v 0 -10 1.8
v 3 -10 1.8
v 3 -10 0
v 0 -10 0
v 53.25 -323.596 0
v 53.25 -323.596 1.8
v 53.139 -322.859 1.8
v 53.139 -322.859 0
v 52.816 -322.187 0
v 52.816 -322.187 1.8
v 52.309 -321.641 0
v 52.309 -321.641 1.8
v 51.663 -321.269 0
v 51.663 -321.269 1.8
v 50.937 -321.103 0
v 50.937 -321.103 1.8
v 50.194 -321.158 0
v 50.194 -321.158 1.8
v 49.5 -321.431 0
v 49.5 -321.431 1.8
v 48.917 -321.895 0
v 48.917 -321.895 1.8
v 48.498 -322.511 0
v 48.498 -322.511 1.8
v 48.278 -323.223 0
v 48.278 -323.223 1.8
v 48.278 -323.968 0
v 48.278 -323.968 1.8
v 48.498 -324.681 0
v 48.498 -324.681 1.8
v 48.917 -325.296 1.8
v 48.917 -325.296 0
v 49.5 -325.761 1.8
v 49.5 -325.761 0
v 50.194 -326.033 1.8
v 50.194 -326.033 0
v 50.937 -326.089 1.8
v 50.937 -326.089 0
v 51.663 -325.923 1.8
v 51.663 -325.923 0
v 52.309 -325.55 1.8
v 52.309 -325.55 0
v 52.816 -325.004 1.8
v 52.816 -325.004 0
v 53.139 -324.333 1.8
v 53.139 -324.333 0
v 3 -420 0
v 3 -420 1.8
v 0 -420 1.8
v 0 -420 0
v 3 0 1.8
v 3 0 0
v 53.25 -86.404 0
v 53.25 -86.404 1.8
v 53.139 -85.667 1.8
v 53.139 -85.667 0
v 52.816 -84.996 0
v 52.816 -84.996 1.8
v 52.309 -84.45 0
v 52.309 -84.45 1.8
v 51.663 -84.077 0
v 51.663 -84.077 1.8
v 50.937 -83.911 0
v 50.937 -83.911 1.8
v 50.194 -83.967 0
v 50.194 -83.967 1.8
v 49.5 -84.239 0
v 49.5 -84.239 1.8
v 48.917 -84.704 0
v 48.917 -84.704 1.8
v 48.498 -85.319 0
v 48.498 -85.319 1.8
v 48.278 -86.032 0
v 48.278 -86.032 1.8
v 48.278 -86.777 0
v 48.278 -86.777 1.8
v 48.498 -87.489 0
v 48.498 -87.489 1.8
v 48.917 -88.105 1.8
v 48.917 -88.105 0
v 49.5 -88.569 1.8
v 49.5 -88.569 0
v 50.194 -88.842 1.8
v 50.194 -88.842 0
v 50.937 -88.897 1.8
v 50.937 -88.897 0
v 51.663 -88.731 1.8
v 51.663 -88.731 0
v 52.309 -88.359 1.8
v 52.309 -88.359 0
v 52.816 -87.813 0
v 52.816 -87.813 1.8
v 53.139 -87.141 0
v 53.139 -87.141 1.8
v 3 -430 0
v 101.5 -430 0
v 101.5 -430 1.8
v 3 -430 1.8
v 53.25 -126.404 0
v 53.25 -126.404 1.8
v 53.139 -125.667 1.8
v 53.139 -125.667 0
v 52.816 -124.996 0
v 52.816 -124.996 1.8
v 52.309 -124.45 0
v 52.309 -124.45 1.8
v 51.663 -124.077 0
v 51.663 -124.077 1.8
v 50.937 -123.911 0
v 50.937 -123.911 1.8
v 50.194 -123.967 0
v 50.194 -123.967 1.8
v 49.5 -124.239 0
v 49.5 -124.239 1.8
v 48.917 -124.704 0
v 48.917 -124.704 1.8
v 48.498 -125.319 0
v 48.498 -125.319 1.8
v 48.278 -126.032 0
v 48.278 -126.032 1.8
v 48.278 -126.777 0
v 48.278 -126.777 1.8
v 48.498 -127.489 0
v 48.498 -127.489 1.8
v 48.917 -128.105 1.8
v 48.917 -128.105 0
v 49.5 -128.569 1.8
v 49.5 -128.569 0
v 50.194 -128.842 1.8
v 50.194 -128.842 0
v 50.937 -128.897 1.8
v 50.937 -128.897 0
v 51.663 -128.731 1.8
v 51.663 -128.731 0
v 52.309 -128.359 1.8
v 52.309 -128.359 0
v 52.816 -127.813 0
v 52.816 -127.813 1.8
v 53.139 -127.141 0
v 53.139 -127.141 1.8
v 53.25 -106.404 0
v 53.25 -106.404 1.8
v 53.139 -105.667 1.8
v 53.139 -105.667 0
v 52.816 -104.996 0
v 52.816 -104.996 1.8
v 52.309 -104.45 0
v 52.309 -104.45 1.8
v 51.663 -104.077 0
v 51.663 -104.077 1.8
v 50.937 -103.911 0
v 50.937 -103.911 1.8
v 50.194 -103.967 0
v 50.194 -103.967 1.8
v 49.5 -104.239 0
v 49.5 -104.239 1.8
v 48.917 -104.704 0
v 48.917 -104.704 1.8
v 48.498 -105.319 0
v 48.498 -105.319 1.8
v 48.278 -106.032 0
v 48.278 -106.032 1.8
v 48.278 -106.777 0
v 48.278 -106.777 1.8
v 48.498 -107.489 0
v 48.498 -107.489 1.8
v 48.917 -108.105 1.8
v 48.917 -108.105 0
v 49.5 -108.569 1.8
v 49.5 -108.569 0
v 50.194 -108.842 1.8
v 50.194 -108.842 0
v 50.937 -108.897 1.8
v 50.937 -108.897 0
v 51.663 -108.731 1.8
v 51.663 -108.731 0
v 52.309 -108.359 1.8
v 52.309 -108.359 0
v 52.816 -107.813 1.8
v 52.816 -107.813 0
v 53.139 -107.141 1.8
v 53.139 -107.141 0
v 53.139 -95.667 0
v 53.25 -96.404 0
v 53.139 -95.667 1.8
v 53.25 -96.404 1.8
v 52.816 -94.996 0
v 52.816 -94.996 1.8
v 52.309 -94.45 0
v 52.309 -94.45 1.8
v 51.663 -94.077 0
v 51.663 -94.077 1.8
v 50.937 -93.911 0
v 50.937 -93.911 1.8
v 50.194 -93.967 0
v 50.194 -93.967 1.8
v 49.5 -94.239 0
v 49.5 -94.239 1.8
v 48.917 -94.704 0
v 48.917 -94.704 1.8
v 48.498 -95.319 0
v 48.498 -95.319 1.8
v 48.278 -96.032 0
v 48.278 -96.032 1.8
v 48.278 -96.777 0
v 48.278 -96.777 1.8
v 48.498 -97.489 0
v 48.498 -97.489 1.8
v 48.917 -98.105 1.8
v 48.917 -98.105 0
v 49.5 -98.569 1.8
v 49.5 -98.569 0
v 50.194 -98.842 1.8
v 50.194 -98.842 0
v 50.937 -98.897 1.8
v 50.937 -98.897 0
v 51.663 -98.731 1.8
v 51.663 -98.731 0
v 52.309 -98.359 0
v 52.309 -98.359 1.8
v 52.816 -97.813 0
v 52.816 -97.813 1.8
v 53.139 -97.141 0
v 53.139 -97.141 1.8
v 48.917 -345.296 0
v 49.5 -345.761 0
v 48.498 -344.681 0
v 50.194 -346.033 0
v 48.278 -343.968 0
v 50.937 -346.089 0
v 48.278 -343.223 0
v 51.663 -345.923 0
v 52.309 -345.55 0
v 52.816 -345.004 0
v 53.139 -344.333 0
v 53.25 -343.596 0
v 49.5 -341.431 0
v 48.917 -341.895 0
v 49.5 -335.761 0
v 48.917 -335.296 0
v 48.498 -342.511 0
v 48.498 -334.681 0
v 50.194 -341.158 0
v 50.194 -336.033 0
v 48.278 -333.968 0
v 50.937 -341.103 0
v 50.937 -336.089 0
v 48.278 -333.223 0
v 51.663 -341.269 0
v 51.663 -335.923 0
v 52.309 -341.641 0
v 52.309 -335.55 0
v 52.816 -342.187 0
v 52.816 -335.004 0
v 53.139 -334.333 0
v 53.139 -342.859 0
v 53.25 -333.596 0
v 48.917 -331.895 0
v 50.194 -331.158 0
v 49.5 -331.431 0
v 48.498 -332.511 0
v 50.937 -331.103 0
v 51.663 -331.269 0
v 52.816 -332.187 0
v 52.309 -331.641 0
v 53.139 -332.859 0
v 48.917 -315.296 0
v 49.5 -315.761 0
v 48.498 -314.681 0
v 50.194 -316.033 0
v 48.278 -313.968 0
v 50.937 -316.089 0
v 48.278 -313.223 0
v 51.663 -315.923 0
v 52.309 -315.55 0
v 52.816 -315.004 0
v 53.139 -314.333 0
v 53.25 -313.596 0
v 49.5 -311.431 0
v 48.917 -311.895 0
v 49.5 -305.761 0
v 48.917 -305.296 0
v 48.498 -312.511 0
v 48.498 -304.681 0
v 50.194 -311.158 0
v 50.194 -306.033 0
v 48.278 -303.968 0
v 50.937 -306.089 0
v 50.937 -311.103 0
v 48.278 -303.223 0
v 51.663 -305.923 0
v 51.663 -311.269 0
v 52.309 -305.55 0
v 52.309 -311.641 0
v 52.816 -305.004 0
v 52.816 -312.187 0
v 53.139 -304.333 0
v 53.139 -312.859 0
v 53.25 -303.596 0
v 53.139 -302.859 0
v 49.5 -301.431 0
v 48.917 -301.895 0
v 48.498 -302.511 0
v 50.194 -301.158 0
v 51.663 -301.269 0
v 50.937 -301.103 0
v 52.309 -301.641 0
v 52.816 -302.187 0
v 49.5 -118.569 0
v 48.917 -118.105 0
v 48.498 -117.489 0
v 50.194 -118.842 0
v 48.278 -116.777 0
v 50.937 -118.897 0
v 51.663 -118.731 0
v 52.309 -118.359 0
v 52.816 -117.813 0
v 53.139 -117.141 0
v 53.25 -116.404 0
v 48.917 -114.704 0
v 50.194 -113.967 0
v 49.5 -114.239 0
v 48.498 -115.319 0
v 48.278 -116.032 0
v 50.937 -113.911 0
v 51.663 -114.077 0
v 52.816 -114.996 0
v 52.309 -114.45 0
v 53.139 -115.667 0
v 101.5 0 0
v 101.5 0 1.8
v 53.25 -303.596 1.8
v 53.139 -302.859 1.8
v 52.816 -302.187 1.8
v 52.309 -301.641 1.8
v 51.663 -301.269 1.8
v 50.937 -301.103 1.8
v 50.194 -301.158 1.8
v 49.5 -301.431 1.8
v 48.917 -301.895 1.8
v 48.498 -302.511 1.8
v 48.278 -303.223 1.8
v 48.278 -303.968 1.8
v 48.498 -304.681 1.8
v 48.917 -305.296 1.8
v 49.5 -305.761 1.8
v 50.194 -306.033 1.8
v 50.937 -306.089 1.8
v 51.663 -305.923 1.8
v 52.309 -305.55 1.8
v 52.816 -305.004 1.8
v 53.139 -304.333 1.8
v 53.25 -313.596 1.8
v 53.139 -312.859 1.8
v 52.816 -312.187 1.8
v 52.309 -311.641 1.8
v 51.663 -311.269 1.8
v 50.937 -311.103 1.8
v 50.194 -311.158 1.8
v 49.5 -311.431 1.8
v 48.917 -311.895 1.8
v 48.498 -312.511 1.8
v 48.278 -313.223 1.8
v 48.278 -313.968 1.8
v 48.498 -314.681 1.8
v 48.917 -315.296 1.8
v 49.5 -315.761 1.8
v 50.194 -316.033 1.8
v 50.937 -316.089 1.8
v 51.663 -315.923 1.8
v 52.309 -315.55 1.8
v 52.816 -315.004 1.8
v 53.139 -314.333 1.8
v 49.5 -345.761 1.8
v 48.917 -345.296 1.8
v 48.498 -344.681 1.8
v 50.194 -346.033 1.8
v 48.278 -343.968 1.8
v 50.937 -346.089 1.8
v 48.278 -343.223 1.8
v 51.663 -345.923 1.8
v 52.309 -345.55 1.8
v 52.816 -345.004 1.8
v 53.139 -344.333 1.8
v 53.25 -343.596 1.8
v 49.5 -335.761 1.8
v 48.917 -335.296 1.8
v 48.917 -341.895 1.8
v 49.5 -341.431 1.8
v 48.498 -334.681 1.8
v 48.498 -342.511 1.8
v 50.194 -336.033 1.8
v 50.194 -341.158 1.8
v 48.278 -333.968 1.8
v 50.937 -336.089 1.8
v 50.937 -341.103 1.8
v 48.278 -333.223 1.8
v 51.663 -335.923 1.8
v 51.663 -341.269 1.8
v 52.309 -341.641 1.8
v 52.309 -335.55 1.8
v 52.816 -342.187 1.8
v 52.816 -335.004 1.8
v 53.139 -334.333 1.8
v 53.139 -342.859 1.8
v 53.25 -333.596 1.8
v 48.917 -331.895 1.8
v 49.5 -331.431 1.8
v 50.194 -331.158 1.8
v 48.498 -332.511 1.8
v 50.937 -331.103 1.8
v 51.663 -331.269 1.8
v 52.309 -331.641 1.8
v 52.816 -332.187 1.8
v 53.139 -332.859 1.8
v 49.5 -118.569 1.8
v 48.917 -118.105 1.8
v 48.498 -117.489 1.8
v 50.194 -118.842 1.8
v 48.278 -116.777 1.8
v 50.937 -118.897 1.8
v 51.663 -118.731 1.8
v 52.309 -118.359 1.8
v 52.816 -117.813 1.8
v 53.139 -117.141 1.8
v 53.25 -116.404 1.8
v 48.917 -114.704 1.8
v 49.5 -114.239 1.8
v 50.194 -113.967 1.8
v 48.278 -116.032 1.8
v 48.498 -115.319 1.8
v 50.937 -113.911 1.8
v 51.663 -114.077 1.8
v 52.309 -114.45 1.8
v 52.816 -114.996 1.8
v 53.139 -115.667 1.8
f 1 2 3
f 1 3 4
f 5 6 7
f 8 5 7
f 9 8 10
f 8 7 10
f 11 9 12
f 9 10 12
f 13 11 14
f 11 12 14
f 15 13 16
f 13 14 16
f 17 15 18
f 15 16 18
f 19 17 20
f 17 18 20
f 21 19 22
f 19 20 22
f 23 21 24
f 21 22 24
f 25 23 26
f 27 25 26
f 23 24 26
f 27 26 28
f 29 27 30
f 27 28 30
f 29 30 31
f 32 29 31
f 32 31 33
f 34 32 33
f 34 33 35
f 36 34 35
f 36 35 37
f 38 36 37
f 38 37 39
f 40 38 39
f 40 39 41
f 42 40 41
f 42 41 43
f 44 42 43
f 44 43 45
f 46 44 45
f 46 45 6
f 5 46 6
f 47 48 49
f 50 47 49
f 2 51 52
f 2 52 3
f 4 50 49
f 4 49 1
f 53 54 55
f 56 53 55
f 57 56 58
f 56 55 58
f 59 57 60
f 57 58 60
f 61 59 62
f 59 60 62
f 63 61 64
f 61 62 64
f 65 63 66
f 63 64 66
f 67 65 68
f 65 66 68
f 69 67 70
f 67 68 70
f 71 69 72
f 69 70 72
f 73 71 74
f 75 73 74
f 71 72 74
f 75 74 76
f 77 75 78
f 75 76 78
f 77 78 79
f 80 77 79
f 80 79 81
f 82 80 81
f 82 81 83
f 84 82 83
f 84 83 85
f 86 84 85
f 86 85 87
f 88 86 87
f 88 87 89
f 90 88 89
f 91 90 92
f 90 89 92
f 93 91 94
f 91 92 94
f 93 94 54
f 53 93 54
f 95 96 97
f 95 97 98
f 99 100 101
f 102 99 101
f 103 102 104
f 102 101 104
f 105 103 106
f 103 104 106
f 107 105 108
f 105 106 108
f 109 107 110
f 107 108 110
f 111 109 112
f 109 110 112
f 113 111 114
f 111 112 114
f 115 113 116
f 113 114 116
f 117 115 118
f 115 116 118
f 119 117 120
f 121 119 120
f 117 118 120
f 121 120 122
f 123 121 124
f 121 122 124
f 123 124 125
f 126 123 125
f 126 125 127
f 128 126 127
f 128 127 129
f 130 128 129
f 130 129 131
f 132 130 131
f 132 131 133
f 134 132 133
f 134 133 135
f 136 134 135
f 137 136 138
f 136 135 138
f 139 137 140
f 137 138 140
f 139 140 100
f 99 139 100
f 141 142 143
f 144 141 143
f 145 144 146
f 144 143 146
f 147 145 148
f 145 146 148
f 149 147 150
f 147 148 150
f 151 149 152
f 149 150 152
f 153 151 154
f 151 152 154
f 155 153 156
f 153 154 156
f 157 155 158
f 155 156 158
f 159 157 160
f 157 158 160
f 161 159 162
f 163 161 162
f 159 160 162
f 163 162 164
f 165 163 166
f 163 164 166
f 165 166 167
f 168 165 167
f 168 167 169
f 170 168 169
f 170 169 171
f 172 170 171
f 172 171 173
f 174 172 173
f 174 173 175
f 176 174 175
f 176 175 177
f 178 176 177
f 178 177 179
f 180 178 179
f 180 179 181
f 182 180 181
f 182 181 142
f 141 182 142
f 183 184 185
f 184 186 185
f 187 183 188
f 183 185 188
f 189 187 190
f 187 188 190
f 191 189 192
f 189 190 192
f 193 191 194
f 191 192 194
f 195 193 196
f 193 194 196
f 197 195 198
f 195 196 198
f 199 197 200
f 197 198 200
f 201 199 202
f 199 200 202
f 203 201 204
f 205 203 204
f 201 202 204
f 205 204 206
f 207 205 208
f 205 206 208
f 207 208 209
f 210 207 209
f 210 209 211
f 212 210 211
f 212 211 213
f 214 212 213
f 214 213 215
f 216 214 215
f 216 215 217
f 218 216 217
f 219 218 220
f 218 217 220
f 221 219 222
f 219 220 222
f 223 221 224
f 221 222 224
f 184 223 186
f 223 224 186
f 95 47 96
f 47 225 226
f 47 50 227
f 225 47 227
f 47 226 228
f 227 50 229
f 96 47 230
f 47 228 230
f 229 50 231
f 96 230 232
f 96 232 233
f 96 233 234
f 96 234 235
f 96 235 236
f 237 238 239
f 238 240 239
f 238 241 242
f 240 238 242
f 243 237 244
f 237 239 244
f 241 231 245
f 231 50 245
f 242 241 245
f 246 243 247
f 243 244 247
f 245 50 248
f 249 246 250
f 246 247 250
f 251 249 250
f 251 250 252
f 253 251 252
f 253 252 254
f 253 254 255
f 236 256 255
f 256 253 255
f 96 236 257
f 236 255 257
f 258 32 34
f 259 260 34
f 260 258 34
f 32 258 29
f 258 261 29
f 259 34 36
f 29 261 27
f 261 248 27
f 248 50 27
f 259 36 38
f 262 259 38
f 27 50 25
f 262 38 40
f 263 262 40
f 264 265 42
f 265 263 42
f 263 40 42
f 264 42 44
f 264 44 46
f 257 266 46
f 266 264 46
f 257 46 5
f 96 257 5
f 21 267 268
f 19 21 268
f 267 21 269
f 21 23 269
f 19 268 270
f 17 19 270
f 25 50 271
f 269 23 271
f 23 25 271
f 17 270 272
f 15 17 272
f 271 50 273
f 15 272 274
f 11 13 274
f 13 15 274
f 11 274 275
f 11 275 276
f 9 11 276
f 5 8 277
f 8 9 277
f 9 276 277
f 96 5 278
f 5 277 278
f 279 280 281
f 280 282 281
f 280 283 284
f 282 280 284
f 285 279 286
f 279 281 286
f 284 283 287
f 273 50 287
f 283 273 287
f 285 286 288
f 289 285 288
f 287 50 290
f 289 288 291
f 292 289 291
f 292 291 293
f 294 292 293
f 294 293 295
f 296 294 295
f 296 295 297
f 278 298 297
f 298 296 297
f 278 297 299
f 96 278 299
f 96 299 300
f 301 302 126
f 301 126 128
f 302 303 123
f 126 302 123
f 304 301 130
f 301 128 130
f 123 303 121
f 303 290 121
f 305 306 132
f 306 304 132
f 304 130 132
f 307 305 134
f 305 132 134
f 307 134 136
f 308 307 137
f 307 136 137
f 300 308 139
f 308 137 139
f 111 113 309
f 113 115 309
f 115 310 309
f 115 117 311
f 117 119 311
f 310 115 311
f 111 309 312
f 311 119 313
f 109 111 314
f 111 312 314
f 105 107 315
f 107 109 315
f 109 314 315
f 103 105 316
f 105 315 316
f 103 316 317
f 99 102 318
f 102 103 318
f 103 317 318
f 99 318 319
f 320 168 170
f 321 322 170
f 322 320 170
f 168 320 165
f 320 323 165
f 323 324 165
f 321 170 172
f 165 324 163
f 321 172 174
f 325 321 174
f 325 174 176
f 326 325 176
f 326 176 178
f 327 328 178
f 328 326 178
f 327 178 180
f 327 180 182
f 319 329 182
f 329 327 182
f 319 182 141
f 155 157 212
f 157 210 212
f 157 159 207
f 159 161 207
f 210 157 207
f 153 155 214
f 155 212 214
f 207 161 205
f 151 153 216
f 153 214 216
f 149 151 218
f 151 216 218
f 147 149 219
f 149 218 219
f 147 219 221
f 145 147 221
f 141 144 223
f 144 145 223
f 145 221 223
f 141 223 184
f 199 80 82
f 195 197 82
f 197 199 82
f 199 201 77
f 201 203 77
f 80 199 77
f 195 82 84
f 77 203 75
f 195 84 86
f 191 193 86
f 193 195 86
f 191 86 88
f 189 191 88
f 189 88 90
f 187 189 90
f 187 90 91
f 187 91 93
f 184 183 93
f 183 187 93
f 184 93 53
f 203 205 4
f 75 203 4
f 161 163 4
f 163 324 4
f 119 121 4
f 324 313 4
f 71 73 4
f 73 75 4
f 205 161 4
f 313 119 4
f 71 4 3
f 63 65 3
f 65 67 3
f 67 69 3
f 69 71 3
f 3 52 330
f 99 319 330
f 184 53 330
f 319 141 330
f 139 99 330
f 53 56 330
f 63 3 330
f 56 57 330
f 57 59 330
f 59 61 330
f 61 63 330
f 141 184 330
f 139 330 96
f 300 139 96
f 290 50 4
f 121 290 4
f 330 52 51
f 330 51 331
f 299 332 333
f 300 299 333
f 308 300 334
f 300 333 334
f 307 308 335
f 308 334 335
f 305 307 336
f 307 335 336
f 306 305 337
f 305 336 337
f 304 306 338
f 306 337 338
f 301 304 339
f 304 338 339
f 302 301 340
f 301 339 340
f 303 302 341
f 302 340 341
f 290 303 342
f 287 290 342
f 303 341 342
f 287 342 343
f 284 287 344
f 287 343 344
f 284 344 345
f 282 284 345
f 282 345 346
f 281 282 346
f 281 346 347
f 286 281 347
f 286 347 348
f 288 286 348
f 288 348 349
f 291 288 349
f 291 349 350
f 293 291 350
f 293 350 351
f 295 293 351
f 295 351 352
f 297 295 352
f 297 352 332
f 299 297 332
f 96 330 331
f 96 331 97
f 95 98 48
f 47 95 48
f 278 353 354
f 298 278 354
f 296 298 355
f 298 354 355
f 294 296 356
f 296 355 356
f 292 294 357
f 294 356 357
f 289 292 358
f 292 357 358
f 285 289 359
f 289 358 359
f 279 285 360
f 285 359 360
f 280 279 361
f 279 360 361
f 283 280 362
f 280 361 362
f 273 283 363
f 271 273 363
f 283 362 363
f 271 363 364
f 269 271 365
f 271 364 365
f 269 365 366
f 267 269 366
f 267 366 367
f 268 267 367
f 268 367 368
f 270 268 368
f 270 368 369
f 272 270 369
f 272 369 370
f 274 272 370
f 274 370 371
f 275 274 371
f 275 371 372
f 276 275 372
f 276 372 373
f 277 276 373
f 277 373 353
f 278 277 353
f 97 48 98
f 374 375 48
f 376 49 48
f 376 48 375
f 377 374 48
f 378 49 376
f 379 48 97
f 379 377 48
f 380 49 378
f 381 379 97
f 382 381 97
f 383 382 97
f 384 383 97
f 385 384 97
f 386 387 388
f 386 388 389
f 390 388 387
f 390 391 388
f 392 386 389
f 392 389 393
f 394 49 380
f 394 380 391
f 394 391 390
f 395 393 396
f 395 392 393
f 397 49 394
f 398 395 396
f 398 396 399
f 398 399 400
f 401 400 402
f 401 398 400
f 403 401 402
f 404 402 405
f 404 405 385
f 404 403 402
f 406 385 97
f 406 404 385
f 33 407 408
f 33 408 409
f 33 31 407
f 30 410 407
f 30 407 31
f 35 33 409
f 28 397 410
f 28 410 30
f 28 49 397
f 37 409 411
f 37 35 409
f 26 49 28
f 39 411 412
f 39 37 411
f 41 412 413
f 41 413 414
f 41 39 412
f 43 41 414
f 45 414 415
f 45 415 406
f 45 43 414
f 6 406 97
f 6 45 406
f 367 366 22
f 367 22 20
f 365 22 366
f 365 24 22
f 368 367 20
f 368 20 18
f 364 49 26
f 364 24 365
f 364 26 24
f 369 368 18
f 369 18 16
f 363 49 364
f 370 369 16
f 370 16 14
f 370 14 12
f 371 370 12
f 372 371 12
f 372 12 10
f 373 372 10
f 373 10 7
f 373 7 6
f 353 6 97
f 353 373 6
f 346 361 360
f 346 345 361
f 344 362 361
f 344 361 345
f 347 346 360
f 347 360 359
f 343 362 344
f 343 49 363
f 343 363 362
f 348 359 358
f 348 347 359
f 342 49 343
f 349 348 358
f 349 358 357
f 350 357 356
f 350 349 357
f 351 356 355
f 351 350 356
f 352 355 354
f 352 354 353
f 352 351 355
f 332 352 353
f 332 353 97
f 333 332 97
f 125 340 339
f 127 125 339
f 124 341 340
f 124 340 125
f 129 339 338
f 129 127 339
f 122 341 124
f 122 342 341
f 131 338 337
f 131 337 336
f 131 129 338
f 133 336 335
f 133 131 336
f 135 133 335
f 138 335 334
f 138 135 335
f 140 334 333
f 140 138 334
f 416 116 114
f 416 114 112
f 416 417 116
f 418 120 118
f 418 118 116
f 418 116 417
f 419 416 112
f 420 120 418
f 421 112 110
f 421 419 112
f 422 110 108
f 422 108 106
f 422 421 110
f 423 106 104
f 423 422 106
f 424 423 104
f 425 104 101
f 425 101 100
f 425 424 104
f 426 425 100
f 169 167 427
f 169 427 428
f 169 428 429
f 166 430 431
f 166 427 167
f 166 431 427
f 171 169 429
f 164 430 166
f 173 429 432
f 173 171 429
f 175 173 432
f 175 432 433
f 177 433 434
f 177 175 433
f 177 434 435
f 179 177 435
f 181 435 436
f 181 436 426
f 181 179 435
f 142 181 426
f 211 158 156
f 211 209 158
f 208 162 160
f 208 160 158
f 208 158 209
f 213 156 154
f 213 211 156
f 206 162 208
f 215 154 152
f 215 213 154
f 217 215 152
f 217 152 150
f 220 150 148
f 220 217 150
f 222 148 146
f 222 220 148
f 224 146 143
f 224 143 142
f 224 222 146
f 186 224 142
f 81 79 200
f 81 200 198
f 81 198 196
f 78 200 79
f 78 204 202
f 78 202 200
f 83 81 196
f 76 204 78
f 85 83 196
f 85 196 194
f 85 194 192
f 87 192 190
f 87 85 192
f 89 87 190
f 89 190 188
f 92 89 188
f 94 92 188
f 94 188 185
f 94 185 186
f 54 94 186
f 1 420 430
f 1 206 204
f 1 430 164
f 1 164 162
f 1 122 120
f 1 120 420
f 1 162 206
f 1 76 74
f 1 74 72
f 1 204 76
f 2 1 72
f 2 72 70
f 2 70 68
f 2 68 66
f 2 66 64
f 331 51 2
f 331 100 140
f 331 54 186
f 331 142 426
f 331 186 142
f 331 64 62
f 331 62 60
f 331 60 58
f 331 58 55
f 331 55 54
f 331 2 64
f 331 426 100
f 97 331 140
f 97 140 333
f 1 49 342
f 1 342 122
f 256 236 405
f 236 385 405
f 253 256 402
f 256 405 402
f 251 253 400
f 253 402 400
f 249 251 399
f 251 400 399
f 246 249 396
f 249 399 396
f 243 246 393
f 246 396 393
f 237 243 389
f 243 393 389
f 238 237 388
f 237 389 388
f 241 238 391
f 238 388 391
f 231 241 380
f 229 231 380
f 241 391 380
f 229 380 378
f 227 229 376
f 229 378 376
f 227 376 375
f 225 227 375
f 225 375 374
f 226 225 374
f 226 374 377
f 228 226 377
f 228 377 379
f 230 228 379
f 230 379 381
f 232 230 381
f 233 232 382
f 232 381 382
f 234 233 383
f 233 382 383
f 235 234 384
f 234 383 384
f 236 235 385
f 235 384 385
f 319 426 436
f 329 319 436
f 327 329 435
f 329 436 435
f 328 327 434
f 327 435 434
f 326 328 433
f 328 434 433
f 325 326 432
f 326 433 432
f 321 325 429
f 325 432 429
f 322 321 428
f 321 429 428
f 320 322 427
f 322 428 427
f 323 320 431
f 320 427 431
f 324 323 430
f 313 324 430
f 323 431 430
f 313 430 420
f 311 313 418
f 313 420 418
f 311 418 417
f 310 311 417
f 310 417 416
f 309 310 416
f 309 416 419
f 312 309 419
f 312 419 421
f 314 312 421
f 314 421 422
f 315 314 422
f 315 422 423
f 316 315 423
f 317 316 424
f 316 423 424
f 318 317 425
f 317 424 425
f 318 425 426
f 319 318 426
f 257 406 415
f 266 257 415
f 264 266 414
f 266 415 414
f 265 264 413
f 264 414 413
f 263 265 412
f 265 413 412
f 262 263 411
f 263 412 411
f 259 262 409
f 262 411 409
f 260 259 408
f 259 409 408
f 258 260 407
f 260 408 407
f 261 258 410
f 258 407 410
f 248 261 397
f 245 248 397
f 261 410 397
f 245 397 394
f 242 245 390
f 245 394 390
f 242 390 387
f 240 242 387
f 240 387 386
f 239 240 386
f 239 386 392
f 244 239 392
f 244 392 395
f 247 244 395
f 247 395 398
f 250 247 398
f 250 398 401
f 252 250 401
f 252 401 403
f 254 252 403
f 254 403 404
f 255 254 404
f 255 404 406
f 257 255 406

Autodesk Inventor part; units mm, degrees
ref_plane "YZ Plane" through (0, 0, 0) normal (1, 0, 0) x (0, 1, 0)
ref_plane "XZ Plane" through (0, 0, 0) normal (0, 1, 0) x (-1, 0, 0)
ref_plane "XY Plane" through (0, 0, 0) normal (0, 0, 1) x (1, 0, 0)
sketch "Sketch1" plane through (0, 0, 0) normal (0, 0, 1) x (1, 0, 0)
  line L0 (0, 0) -> (101.5, 0)
  line L1 (101.5, 0) -> (101.5, -430)
  line L2 (101.5, -430) -> (0, -430)
  line L3 (0, -430) -> (0, 0)
  dimension "d0" = 101.5
  dimension "d1" = 430
extrude "Extrusion1" add sketch "Sketch1" along normal blind 1.8
sketch "Sketch2" plane through (0, 0, 1.8) normal (0, 0, 1) x (1, 0, 0)
  line L0 (0, 0) -> (0, -430) projected
  line L1 (101.5, -430) -> (101.5, 0) projected
  line L2 (0, 0) -> (101.5, 0)
  line L3 (101.5, 0) -> (101.5, -10)
  line L4 (101.5, -10) -> (0, -10)
  line L5 (0, -10) -> (0, 0)
  line L6 (50.75, -10) -> (140.75, -10)
  line L7 (140.75, -10) -> (140.75, -106.4042)
  line L8 (140.75, -106.4042) -> (50.75, -106.4042)
  line L9 (50.75, -106.4042) -> (50.75, -10)
  circle A0 centre (50.75, -106.4042) radius 2.5
  line L10 (50.75, -106.4042) -> (50.75, -126.4042)
  circle A1 centre (50.75, -126.4042) radius 2.5
  line L11 (50.75, -106.4042) -> (50.75, -86.4042)
  circle A2 centre (50.75, -86.4042) radius 2.5
  circle A3 centre (50.75, -96.4042) radius 2.5
  circle A4 centre (50.75, -116.4042) radius 2.5
  line L12 (101.5, 0) -> (0, 0) projected
  line L13 (0, -430) -> (101.5, -430) projected
  line L14 (0, 0) -> (101.5, -430)
  line L15 (101.5, -430) -> (50.75, -215)
  line L16 (50.75, -215) -> (87.135, -215)
  circle A5 centre (50.75, -323.5958) radius 2.5
  line L17 (50.75, -323.5958) -> (50.75, -303.5958)
  circle A6 centre (50.75, -303.5958) radius 2.5
  line L18 (50.75, -323.5958) -> (50.75, -343.5958)
  circle A7 centre (50.75, -343.5958) radius 2.5
  circle A8 centre (50.75, -333.5958) radius 2.5
  circle A9 centre (50.75, -313.5958) radius 2.5
  dimension "d4" = 10
  dimension "d5" = 90
  dimension "d6" = 5
  dimension "d7" = 20
  dimension "d8" = 20
  dimension "d9" = 5
  dimension "d10" = 5
  dimension "d11" = 5
extrude "Extrusion2" cut sketch "Sketch2" against normal blind 10 contours A1 | A4 L10 | L10 A4 | A2 L9 | L9 A2 | A0 L10 L8 | L8 L9 A0 | L10 A0 L9 | A3 L9 | L9 A3 | A5 L18 L17 | A7 | A8 L18 | L18 A8 | A6 | A9 L17 | L17 A9 | L17 L18 A5
sketch "Sketch3" plane through (0, 0, 1.8) normal (0, 0, 1) x (1, 0, 0)
  line L0 (101.5, 0) -> (0, 0) projected
  line L1 (0, 0) -> (3, 0)
  line L2 (3, 0) -> (3, -10)
  line L3 (3, -10) -> (0, -10)
  line L4 (0, -10) -> (0, 0)
  line L5 (0, 0) -> (0, -430) projected
  line L6 (0, -430) -> (3, -430)
  line L7 (3, -430) -> (3, -420)
  line L8 (3, -420) -> (0, -420)
  line L9 (0, -420) -> (0, -430)
  point P0 (0, -420)
  dimension "d14" = 3
  dimension "d15" = 10
  dimension "d16" = 3
  dimension "d17" = 10
extrude "Extrusion3" cut sketch "Sketch3" against normal blind 10
properties part number "7000_Aluminum_Chasis_Coil_Assembly_Separator_MPSv2_v1" material "Aluminum 6061"
